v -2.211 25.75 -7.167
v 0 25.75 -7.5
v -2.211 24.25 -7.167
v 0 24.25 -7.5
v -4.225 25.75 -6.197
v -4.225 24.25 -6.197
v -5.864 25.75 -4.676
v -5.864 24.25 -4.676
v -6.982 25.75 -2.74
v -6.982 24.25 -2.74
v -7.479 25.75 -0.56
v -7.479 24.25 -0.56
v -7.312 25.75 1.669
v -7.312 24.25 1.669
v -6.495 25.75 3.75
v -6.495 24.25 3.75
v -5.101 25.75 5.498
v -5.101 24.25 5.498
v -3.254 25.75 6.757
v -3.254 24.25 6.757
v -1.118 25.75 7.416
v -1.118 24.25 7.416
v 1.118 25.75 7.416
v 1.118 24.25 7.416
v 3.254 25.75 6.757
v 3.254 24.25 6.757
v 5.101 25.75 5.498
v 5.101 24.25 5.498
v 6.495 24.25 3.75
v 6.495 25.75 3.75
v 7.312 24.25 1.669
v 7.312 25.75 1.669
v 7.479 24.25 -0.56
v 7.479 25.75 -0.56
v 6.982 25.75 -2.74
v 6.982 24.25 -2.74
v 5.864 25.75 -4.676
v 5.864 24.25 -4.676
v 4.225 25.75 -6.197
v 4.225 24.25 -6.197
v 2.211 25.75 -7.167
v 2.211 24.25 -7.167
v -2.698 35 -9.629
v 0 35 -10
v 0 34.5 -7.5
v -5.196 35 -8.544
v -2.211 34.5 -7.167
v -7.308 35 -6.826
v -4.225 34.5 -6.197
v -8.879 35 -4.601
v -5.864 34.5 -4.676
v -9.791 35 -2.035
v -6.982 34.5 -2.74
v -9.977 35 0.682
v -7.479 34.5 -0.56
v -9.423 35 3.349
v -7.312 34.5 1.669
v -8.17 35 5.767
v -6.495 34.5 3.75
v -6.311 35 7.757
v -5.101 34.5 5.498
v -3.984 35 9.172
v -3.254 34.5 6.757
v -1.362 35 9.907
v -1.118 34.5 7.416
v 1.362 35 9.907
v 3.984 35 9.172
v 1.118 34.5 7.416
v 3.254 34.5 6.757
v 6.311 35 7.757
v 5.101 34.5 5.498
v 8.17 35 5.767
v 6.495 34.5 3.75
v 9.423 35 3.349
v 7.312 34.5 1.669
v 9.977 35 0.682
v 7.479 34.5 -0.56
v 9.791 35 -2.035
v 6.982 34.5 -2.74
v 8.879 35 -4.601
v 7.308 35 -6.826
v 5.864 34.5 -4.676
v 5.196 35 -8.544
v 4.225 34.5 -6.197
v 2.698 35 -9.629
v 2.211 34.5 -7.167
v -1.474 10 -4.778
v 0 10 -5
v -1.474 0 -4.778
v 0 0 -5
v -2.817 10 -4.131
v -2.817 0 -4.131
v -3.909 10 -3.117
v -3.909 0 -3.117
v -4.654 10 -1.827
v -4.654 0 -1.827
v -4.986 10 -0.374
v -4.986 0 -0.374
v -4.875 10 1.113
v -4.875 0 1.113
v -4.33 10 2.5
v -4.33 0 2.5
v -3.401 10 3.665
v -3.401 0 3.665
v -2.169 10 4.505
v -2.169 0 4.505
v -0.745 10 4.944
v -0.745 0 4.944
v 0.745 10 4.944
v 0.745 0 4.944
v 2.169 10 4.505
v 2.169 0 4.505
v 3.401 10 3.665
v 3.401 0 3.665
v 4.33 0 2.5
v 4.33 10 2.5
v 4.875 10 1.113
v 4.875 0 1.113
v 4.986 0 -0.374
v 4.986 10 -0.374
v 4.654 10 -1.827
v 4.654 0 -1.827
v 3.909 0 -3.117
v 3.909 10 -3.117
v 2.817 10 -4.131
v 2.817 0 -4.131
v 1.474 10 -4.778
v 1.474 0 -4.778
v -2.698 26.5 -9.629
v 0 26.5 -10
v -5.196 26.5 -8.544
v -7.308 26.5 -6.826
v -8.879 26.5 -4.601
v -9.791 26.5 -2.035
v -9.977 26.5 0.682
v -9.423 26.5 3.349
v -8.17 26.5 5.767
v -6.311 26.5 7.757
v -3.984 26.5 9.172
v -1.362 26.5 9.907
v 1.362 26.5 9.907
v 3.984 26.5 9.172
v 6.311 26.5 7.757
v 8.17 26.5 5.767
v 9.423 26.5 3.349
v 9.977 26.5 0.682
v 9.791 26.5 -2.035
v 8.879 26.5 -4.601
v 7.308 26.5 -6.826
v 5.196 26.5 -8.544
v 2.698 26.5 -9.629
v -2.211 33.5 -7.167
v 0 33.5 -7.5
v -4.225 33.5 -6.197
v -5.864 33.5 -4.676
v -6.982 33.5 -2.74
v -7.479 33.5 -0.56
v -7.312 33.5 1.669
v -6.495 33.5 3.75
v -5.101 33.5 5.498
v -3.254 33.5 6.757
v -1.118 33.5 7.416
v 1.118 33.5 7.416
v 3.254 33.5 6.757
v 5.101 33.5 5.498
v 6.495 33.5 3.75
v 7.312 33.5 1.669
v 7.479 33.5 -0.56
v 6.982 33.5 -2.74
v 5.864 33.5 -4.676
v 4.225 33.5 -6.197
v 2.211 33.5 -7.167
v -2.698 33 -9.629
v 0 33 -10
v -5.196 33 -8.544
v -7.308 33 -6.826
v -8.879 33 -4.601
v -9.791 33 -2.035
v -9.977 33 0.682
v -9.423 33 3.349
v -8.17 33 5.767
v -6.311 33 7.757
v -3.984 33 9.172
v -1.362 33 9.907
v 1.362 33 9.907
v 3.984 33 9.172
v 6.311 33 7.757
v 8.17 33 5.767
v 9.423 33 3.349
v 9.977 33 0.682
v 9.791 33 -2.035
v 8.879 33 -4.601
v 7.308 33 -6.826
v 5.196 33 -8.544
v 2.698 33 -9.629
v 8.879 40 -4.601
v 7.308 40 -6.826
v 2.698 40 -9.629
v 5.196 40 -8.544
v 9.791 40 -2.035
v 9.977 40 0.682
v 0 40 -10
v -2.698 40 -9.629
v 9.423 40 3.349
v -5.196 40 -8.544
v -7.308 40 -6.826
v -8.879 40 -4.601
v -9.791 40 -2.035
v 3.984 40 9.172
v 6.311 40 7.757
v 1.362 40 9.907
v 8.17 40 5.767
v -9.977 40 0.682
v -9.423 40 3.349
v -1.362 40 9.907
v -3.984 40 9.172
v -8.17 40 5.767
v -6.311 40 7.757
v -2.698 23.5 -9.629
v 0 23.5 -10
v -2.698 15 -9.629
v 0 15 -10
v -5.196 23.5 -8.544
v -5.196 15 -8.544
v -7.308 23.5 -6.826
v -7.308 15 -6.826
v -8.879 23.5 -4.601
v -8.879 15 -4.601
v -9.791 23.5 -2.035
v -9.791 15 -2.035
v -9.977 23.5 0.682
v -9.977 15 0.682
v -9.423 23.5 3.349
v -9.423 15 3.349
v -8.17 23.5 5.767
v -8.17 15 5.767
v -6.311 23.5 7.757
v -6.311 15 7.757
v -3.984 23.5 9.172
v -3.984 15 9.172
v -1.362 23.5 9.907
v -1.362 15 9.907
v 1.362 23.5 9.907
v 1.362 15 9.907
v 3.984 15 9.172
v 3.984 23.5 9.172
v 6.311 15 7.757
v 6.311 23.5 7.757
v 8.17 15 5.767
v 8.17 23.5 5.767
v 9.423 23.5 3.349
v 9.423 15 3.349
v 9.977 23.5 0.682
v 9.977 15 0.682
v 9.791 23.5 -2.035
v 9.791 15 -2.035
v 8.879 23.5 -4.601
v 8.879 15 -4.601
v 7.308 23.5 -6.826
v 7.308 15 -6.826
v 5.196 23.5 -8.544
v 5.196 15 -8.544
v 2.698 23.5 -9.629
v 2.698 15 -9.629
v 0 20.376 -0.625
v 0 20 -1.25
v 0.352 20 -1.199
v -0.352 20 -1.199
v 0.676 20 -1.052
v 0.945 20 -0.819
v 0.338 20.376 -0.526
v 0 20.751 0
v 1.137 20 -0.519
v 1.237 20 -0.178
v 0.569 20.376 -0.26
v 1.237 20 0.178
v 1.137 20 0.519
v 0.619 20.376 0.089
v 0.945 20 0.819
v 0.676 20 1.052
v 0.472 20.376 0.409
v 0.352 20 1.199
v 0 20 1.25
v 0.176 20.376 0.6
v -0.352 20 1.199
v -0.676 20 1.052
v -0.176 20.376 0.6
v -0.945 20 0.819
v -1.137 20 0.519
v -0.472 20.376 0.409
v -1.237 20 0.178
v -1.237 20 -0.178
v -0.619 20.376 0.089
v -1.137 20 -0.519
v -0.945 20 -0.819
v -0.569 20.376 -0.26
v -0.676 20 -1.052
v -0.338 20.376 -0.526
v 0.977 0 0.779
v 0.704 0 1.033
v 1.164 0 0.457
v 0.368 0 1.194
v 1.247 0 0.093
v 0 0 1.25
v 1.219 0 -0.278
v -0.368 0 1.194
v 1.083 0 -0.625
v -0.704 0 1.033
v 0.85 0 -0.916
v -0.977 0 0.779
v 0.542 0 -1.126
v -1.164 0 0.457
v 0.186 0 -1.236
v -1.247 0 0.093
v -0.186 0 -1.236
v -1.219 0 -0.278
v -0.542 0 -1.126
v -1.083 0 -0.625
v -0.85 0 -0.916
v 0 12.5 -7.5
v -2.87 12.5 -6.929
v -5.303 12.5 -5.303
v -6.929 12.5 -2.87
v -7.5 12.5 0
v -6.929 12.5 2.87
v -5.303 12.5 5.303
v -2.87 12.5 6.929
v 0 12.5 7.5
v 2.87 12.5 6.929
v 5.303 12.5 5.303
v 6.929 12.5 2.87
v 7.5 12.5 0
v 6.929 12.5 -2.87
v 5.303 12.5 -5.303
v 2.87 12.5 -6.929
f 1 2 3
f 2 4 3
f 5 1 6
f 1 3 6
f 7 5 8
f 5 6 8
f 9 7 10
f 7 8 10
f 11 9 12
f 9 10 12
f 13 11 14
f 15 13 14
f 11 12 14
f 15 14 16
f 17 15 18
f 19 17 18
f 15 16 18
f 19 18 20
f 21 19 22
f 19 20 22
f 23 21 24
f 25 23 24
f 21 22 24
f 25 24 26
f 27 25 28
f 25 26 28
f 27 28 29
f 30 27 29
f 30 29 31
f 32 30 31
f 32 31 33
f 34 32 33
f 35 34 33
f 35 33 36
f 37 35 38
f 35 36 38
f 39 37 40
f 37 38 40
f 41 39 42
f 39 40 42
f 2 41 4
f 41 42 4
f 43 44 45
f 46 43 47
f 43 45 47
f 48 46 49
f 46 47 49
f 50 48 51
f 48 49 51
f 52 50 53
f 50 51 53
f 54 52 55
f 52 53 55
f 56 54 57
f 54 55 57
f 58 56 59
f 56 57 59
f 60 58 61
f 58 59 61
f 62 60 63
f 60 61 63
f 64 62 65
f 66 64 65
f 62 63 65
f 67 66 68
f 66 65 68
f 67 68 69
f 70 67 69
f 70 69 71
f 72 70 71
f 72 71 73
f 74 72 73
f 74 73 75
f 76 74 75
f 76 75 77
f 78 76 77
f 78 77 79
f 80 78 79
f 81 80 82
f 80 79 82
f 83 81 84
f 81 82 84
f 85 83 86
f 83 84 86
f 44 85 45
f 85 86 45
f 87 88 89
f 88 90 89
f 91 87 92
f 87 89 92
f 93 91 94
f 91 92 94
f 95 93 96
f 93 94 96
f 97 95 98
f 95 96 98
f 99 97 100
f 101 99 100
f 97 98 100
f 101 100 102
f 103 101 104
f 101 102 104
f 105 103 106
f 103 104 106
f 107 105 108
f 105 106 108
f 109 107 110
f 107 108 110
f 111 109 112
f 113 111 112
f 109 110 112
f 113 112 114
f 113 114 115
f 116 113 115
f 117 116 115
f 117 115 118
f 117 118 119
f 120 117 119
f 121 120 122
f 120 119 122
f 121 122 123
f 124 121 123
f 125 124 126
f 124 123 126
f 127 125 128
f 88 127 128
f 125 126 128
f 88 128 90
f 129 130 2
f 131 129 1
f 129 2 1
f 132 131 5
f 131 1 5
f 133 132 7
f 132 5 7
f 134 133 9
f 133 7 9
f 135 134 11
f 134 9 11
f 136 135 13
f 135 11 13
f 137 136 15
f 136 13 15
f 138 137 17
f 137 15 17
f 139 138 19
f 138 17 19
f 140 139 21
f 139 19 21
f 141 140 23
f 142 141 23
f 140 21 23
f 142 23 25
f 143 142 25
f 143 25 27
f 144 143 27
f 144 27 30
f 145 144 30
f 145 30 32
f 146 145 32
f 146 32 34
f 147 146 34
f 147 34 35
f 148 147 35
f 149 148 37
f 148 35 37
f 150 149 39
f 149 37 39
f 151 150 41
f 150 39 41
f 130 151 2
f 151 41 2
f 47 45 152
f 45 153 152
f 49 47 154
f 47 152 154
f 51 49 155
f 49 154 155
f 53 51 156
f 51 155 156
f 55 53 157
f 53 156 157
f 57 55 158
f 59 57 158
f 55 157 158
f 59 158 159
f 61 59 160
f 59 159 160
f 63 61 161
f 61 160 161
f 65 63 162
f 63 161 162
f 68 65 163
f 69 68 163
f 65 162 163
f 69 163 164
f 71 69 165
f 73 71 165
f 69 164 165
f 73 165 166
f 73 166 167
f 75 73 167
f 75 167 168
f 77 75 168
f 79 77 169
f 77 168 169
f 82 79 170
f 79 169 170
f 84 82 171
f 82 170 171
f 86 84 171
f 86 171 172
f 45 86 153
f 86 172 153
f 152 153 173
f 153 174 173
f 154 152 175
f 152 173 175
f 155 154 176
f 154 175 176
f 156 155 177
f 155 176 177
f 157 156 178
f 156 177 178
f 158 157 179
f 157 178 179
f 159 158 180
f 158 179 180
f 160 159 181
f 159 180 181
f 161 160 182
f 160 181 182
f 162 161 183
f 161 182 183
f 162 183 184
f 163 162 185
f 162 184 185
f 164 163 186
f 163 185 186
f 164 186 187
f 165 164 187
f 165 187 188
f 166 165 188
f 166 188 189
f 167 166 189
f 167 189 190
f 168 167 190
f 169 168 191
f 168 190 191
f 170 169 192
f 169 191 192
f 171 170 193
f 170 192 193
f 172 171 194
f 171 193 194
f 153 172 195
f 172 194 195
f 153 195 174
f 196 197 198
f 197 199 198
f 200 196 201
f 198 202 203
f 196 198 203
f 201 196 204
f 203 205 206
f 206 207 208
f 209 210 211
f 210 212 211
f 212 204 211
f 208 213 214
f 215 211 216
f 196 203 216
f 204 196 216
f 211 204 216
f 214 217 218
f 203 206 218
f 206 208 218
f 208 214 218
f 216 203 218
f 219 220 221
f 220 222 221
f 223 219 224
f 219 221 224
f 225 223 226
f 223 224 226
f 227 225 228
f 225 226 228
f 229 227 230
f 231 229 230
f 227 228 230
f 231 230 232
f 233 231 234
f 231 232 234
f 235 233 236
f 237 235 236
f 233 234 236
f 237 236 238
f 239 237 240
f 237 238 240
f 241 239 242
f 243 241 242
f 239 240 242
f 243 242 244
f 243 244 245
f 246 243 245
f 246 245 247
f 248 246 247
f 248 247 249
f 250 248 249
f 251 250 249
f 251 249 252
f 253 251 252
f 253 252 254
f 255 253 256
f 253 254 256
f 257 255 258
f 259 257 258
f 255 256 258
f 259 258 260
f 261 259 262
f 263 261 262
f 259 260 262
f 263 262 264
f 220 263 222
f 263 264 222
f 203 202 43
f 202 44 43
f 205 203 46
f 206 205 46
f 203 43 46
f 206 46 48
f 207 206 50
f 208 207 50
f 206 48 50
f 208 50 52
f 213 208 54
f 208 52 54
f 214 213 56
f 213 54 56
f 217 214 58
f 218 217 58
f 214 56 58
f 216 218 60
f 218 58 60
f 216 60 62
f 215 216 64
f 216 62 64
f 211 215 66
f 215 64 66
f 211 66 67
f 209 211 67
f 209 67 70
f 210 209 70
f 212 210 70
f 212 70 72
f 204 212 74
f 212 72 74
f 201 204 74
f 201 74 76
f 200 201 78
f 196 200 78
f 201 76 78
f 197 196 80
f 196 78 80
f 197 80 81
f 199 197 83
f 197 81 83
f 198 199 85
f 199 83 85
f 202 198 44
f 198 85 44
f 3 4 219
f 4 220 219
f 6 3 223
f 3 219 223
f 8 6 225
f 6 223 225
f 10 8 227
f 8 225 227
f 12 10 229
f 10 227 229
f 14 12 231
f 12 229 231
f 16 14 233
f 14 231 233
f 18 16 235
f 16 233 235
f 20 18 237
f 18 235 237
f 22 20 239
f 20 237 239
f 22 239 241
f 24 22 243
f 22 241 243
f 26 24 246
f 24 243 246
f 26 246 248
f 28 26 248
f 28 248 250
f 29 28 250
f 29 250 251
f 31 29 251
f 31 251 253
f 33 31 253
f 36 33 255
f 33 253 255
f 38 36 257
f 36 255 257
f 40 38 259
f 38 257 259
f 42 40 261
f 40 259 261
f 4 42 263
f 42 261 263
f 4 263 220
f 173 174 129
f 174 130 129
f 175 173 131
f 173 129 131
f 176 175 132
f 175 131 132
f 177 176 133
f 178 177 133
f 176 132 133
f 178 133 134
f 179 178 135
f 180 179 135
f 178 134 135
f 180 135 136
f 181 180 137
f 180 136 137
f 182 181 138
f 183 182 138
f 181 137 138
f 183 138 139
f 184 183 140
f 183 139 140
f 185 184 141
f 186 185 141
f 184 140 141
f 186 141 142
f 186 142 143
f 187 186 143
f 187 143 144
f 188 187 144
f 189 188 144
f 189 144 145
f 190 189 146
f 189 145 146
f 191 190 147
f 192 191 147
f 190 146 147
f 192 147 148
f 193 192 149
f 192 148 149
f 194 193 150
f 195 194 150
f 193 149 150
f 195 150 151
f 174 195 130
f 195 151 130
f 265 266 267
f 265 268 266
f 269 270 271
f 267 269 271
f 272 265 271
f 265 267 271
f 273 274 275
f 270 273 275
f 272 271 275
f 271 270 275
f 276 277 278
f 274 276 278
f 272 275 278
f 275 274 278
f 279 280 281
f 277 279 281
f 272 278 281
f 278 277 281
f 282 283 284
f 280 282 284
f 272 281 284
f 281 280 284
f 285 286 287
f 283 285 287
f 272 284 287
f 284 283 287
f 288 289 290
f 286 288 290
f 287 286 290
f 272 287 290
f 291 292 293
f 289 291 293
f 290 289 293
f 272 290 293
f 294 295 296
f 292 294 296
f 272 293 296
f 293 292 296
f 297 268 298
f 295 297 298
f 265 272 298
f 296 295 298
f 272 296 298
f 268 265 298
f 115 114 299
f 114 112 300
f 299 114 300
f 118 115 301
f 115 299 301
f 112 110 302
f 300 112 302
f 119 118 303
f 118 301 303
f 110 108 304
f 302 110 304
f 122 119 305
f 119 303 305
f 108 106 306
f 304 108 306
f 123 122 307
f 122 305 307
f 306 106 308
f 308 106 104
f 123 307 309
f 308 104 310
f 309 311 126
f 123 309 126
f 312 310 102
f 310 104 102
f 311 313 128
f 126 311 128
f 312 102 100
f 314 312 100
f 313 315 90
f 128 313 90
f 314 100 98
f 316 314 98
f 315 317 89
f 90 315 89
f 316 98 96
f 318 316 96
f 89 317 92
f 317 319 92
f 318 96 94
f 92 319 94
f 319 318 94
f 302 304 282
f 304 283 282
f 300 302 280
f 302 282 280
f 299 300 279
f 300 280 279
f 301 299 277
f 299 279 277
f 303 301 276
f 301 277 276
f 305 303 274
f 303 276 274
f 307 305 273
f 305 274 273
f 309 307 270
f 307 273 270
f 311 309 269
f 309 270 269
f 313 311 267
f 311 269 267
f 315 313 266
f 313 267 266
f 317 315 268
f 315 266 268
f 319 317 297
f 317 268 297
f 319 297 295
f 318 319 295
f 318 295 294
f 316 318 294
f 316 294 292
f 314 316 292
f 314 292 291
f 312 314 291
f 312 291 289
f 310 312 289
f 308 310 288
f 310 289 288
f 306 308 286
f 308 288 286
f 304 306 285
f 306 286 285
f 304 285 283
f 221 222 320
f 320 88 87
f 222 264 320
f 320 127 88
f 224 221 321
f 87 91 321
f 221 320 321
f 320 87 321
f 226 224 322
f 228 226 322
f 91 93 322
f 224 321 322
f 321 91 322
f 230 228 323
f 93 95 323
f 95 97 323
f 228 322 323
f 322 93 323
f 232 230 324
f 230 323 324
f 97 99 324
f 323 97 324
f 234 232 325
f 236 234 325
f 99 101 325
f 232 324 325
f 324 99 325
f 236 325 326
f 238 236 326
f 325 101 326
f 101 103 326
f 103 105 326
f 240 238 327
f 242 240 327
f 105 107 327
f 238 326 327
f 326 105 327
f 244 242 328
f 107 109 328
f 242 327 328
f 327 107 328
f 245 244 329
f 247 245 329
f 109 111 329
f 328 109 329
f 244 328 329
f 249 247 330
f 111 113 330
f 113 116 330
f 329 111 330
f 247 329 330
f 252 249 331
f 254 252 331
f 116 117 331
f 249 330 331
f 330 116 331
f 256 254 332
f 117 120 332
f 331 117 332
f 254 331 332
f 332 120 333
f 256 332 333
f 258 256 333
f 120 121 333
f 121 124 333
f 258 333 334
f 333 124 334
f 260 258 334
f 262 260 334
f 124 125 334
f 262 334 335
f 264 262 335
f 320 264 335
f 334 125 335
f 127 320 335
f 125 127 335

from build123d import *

# Parameters (mm, degrees)
M3_GEWINDEBOHRUNG1_D     = 2.5
M3_GEWINDEBOHRUNG1_DEPTH = 20
M3_GEWINDEBOHRUNG1_TIP   = 0.751075774


with BuildPart() as part:
    # Esboço1 → Revolução1 (revolve)
    with BuildSketch(Plane.XY, mode=Mode.PRIVATE) as revolu_o1_sk:
        Polygon((0, 0), (0, 40), (10, 40), (10, 35), (7.5, 34.5), (7.5, 33.5), (10, 33), (10, 26.5), (7.5, 25.75), (7.5, 24.25), (10, 23.5), (10, 15), (5, 10), (5, 0), align=None)
    revolve(revolu_o1_sk.sketch.rotate(Axis((0, 0, 0), (0, 1, 0)), 90), axis=Axis((0, 0, 0), (0, 1, 0)))

    # M3 Gewindebohrung1
    with Locations(Plane(origin=(0, 0, 0), x_dir=(0, 0, -1), z_dir=(0, -1, 0))):
        with Locations((0, 0)):
            Hole(M3_GEWINDEBOHRUNG1_D / 2, depth=M3_GEWINDEBOHRUNG1_DEPTH)
            with Locations((0, 0, -(M3_GEWINDEBOHRUNG1_DEPTH + M3_GEWINDEBOHRUNG1_TIP / 2))):  # 118° drill point
                Cone(0, M3_GEWINDEBOHRUNG1_D / 2, M3_GEWINDEBOHRUNG1_TIP, mode=Mode.SUBTRACT)


solid = part.part
